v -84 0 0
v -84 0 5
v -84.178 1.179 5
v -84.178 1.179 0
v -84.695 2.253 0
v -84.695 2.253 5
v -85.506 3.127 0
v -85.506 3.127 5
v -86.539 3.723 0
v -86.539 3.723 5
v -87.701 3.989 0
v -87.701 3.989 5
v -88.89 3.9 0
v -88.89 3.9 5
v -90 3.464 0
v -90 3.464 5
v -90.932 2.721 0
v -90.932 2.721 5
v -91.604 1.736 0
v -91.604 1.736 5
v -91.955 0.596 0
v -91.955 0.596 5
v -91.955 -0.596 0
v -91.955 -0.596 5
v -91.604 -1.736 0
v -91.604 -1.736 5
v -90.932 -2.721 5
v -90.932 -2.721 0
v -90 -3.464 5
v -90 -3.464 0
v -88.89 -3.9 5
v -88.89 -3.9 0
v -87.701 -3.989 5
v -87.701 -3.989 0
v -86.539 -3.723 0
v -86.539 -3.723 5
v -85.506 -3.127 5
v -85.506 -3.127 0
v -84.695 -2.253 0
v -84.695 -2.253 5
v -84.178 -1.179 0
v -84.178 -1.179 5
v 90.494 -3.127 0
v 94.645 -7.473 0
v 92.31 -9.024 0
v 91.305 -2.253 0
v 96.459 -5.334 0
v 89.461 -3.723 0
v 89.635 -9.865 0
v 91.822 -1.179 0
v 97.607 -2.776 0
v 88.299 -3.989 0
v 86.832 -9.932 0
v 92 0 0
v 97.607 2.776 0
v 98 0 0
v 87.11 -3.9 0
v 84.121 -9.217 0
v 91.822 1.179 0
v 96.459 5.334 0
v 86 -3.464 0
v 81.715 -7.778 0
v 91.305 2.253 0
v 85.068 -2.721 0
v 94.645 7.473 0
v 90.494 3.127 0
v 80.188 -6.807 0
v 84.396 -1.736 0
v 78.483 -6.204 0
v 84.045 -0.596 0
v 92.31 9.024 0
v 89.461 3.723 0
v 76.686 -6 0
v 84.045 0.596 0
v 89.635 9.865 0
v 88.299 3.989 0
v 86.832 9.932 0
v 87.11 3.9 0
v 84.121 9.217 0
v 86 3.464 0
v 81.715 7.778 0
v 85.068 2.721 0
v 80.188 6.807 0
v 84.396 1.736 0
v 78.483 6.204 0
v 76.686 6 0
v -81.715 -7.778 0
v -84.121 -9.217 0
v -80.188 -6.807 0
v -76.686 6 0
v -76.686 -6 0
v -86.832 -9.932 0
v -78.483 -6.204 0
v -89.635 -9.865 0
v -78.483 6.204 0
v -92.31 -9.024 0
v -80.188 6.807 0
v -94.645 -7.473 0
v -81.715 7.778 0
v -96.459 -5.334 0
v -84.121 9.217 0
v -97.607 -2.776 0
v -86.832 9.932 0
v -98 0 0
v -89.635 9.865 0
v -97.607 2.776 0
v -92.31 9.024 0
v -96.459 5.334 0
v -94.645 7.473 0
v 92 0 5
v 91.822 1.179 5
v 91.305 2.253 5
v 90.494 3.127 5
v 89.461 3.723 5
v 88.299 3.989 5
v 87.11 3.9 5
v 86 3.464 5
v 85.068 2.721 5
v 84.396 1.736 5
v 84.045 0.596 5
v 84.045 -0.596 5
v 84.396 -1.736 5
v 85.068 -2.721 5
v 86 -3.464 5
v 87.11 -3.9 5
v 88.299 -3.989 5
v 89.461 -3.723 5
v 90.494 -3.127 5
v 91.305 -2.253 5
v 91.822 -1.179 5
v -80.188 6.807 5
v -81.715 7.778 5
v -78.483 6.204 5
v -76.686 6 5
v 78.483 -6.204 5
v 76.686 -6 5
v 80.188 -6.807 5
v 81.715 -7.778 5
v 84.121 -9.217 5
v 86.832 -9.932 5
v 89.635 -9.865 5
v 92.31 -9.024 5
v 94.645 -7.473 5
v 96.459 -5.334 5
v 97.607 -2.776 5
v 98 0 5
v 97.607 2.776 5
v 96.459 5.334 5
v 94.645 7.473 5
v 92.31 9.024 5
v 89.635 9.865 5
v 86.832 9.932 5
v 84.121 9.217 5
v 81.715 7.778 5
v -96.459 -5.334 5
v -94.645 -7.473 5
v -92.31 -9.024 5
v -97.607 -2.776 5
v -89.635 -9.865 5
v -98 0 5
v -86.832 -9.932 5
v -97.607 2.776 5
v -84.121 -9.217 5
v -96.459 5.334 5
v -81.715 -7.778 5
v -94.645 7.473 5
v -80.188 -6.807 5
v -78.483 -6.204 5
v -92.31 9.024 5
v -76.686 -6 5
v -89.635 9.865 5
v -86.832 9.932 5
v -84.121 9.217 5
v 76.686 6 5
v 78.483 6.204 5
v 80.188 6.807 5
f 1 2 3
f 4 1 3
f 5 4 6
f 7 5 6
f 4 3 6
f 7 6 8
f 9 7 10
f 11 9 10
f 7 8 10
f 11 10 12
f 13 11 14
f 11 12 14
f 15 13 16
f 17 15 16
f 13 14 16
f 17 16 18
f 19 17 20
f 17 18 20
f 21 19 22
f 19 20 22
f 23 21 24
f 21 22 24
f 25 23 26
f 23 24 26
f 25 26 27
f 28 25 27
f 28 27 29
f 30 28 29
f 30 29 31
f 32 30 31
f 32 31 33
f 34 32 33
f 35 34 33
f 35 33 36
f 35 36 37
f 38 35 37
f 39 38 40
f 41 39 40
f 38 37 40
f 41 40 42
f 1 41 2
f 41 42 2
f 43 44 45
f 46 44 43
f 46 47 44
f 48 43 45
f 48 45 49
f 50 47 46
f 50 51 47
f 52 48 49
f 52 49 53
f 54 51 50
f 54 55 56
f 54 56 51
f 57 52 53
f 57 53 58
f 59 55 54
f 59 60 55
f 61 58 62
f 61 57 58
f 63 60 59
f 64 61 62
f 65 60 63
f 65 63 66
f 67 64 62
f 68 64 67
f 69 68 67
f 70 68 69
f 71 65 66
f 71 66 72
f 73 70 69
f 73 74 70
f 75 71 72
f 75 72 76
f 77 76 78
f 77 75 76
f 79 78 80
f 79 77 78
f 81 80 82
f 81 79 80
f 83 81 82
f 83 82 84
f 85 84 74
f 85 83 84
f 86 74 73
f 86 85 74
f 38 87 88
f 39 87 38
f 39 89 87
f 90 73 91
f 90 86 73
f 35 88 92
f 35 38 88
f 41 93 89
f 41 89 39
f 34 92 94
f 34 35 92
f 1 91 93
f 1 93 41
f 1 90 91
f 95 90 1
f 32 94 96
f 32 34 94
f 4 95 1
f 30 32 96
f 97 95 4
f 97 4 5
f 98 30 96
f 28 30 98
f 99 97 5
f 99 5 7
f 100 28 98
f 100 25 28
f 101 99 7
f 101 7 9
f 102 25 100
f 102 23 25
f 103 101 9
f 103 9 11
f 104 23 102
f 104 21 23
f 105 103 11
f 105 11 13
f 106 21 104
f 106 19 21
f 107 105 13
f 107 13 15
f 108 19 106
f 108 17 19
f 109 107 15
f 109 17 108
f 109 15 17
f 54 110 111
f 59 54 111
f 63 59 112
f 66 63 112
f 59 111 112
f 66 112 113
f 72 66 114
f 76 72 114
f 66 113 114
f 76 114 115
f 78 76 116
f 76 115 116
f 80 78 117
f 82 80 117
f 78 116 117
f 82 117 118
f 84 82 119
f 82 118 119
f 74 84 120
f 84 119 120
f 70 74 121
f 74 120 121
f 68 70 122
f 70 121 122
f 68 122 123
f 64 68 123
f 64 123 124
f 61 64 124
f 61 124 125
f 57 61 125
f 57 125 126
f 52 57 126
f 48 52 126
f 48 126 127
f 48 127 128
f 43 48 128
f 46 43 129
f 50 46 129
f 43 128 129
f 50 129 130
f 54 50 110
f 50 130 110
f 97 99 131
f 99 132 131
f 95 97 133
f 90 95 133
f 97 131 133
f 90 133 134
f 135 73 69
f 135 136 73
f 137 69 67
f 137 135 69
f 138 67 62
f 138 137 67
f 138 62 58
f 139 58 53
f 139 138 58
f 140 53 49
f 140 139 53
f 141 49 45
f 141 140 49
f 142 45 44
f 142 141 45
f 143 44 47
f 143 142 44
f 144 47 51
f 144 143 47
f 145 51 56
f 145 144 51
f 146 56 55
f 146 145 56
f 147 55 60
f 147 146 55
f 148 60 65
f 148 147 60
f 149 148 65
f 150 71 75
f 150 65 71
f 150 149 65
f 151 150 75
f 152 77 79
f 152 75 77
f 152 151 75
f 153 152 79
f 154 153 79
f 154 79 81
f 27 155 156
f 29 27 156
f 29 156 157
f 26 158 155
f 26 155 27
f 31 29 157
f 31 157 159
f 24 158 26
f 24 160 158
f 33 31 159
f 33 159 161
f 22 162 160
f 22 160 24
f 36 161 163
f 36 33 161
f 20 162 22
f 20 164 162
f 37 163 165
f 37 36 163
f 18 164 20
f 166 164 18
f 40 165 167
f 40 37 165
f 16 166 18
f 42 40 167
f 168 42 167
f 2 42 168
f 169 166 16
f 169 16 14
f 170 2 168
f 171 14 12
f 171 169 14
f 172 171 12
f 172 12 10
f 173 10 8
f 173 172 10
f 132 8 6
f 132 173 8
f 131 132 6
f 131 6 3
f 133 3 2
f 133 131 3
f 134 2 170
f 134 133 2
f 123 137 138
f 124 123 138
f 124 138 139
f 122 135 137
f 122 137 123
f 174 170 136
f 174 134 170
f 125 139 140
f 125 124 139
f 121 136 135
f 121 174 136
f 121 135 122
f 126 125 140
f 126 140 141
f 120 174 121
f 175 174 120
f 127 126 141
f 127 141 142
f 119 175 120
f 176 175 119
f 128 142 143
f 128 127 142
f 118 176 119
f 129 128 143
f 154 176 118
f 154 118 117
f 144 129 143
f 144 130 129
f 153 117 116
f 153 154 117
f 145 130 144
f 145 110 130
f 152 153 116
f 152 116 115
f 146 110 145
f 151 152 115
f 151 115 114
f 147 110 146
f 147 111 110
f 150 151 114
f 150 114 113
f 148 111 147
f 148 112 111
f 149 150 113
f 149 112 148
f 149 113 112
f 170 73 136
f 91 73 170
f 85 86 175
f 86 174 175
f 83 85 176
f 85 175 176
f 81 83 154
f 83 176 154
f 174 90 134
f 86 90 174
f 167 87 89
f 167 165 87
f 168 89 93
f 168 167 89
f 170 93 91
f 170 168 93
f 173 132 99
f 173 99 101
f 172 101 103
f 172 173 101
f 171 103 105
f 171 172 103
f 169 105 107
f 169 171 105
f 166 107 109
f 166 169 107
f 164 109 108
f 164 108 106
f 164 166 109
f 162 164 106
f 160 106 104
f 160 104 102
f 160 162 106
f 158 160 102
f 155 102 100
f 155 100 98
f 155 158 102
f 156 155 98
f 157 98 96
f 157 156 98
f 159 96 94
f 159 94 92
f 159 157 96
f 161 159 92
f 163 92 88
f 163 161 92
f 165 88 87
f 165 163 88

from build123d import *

# Parameters (mm, degrees)
SKETCH_1_R          = 2.1
EXTRUDE_1_DEPTH     = 5
SKETCH_2_R          = 10
EXTRUDE_2_DEPTH     = 5
SKETCH_3_R          = 4
CUT_EXTRUDE_1_DEPTH = 5
FILLET_1_R          = 8


with BuildPart() as part:
    # 草图1 → 凸台-拉伸1 (new body)
    with BuildSketch(Plane.XY):
        with BuildLine():
            Line((-88, 6), (88, 6))
            ThreePointArc((88, 6), (94, 0), (88, -6))
            Line((88, -6), (-88, -6))
            ThreePointArc((-88, -6), (-94, 0), (-88, 6))
        make_face()
        with Locations((88, 0)):
            Circle(SKETCH_1_R, mode=Mode.SUBTRACT)
        with Locations((-88, 0)):
            Circle(SKETCH_1_R, mode=Mode.SUBTRACT)
    extrude(amount=EXTRUDE_1_DEPTH)

    # 草图2 → 凸台-拉伸2 (add)
    with BuildSketch(Plane.XY.offset(5)):
        with Locations((-88, 0)):
            Circle(SKETCH_2_R)
        with Locations((88, 0)):
            Circle(SKETCH_2_R)
    extrude(amount=-EXTRUDE_2_DEPTH)

    # 草图3 → 切除-拉伸1 (cut)
    with BuildSketch(Plane.XY.offset(5)):
        with Locations((-88, 0)):
            Circle(SKETCH_3_R)
        with Locations((88, 0)):
            Circle(SKETCH_3_R)
    extrude(amount=-CUT_EXTRUDE_1_DEPTH, mode=Mode.SUBTRACT)

    # 圆角1
    fillet_1_edges = [part.edges().sort_by_distance(p)[0] for p in [
        (-80, 6, 2.5),
        (-80, -6, 2.5),
        (80, 6, 2.5),
        (80, -6, 2.5),
    ]]
    fillet(fillet_1_edges, radius=FILLET_1_R)


solid = part.part
